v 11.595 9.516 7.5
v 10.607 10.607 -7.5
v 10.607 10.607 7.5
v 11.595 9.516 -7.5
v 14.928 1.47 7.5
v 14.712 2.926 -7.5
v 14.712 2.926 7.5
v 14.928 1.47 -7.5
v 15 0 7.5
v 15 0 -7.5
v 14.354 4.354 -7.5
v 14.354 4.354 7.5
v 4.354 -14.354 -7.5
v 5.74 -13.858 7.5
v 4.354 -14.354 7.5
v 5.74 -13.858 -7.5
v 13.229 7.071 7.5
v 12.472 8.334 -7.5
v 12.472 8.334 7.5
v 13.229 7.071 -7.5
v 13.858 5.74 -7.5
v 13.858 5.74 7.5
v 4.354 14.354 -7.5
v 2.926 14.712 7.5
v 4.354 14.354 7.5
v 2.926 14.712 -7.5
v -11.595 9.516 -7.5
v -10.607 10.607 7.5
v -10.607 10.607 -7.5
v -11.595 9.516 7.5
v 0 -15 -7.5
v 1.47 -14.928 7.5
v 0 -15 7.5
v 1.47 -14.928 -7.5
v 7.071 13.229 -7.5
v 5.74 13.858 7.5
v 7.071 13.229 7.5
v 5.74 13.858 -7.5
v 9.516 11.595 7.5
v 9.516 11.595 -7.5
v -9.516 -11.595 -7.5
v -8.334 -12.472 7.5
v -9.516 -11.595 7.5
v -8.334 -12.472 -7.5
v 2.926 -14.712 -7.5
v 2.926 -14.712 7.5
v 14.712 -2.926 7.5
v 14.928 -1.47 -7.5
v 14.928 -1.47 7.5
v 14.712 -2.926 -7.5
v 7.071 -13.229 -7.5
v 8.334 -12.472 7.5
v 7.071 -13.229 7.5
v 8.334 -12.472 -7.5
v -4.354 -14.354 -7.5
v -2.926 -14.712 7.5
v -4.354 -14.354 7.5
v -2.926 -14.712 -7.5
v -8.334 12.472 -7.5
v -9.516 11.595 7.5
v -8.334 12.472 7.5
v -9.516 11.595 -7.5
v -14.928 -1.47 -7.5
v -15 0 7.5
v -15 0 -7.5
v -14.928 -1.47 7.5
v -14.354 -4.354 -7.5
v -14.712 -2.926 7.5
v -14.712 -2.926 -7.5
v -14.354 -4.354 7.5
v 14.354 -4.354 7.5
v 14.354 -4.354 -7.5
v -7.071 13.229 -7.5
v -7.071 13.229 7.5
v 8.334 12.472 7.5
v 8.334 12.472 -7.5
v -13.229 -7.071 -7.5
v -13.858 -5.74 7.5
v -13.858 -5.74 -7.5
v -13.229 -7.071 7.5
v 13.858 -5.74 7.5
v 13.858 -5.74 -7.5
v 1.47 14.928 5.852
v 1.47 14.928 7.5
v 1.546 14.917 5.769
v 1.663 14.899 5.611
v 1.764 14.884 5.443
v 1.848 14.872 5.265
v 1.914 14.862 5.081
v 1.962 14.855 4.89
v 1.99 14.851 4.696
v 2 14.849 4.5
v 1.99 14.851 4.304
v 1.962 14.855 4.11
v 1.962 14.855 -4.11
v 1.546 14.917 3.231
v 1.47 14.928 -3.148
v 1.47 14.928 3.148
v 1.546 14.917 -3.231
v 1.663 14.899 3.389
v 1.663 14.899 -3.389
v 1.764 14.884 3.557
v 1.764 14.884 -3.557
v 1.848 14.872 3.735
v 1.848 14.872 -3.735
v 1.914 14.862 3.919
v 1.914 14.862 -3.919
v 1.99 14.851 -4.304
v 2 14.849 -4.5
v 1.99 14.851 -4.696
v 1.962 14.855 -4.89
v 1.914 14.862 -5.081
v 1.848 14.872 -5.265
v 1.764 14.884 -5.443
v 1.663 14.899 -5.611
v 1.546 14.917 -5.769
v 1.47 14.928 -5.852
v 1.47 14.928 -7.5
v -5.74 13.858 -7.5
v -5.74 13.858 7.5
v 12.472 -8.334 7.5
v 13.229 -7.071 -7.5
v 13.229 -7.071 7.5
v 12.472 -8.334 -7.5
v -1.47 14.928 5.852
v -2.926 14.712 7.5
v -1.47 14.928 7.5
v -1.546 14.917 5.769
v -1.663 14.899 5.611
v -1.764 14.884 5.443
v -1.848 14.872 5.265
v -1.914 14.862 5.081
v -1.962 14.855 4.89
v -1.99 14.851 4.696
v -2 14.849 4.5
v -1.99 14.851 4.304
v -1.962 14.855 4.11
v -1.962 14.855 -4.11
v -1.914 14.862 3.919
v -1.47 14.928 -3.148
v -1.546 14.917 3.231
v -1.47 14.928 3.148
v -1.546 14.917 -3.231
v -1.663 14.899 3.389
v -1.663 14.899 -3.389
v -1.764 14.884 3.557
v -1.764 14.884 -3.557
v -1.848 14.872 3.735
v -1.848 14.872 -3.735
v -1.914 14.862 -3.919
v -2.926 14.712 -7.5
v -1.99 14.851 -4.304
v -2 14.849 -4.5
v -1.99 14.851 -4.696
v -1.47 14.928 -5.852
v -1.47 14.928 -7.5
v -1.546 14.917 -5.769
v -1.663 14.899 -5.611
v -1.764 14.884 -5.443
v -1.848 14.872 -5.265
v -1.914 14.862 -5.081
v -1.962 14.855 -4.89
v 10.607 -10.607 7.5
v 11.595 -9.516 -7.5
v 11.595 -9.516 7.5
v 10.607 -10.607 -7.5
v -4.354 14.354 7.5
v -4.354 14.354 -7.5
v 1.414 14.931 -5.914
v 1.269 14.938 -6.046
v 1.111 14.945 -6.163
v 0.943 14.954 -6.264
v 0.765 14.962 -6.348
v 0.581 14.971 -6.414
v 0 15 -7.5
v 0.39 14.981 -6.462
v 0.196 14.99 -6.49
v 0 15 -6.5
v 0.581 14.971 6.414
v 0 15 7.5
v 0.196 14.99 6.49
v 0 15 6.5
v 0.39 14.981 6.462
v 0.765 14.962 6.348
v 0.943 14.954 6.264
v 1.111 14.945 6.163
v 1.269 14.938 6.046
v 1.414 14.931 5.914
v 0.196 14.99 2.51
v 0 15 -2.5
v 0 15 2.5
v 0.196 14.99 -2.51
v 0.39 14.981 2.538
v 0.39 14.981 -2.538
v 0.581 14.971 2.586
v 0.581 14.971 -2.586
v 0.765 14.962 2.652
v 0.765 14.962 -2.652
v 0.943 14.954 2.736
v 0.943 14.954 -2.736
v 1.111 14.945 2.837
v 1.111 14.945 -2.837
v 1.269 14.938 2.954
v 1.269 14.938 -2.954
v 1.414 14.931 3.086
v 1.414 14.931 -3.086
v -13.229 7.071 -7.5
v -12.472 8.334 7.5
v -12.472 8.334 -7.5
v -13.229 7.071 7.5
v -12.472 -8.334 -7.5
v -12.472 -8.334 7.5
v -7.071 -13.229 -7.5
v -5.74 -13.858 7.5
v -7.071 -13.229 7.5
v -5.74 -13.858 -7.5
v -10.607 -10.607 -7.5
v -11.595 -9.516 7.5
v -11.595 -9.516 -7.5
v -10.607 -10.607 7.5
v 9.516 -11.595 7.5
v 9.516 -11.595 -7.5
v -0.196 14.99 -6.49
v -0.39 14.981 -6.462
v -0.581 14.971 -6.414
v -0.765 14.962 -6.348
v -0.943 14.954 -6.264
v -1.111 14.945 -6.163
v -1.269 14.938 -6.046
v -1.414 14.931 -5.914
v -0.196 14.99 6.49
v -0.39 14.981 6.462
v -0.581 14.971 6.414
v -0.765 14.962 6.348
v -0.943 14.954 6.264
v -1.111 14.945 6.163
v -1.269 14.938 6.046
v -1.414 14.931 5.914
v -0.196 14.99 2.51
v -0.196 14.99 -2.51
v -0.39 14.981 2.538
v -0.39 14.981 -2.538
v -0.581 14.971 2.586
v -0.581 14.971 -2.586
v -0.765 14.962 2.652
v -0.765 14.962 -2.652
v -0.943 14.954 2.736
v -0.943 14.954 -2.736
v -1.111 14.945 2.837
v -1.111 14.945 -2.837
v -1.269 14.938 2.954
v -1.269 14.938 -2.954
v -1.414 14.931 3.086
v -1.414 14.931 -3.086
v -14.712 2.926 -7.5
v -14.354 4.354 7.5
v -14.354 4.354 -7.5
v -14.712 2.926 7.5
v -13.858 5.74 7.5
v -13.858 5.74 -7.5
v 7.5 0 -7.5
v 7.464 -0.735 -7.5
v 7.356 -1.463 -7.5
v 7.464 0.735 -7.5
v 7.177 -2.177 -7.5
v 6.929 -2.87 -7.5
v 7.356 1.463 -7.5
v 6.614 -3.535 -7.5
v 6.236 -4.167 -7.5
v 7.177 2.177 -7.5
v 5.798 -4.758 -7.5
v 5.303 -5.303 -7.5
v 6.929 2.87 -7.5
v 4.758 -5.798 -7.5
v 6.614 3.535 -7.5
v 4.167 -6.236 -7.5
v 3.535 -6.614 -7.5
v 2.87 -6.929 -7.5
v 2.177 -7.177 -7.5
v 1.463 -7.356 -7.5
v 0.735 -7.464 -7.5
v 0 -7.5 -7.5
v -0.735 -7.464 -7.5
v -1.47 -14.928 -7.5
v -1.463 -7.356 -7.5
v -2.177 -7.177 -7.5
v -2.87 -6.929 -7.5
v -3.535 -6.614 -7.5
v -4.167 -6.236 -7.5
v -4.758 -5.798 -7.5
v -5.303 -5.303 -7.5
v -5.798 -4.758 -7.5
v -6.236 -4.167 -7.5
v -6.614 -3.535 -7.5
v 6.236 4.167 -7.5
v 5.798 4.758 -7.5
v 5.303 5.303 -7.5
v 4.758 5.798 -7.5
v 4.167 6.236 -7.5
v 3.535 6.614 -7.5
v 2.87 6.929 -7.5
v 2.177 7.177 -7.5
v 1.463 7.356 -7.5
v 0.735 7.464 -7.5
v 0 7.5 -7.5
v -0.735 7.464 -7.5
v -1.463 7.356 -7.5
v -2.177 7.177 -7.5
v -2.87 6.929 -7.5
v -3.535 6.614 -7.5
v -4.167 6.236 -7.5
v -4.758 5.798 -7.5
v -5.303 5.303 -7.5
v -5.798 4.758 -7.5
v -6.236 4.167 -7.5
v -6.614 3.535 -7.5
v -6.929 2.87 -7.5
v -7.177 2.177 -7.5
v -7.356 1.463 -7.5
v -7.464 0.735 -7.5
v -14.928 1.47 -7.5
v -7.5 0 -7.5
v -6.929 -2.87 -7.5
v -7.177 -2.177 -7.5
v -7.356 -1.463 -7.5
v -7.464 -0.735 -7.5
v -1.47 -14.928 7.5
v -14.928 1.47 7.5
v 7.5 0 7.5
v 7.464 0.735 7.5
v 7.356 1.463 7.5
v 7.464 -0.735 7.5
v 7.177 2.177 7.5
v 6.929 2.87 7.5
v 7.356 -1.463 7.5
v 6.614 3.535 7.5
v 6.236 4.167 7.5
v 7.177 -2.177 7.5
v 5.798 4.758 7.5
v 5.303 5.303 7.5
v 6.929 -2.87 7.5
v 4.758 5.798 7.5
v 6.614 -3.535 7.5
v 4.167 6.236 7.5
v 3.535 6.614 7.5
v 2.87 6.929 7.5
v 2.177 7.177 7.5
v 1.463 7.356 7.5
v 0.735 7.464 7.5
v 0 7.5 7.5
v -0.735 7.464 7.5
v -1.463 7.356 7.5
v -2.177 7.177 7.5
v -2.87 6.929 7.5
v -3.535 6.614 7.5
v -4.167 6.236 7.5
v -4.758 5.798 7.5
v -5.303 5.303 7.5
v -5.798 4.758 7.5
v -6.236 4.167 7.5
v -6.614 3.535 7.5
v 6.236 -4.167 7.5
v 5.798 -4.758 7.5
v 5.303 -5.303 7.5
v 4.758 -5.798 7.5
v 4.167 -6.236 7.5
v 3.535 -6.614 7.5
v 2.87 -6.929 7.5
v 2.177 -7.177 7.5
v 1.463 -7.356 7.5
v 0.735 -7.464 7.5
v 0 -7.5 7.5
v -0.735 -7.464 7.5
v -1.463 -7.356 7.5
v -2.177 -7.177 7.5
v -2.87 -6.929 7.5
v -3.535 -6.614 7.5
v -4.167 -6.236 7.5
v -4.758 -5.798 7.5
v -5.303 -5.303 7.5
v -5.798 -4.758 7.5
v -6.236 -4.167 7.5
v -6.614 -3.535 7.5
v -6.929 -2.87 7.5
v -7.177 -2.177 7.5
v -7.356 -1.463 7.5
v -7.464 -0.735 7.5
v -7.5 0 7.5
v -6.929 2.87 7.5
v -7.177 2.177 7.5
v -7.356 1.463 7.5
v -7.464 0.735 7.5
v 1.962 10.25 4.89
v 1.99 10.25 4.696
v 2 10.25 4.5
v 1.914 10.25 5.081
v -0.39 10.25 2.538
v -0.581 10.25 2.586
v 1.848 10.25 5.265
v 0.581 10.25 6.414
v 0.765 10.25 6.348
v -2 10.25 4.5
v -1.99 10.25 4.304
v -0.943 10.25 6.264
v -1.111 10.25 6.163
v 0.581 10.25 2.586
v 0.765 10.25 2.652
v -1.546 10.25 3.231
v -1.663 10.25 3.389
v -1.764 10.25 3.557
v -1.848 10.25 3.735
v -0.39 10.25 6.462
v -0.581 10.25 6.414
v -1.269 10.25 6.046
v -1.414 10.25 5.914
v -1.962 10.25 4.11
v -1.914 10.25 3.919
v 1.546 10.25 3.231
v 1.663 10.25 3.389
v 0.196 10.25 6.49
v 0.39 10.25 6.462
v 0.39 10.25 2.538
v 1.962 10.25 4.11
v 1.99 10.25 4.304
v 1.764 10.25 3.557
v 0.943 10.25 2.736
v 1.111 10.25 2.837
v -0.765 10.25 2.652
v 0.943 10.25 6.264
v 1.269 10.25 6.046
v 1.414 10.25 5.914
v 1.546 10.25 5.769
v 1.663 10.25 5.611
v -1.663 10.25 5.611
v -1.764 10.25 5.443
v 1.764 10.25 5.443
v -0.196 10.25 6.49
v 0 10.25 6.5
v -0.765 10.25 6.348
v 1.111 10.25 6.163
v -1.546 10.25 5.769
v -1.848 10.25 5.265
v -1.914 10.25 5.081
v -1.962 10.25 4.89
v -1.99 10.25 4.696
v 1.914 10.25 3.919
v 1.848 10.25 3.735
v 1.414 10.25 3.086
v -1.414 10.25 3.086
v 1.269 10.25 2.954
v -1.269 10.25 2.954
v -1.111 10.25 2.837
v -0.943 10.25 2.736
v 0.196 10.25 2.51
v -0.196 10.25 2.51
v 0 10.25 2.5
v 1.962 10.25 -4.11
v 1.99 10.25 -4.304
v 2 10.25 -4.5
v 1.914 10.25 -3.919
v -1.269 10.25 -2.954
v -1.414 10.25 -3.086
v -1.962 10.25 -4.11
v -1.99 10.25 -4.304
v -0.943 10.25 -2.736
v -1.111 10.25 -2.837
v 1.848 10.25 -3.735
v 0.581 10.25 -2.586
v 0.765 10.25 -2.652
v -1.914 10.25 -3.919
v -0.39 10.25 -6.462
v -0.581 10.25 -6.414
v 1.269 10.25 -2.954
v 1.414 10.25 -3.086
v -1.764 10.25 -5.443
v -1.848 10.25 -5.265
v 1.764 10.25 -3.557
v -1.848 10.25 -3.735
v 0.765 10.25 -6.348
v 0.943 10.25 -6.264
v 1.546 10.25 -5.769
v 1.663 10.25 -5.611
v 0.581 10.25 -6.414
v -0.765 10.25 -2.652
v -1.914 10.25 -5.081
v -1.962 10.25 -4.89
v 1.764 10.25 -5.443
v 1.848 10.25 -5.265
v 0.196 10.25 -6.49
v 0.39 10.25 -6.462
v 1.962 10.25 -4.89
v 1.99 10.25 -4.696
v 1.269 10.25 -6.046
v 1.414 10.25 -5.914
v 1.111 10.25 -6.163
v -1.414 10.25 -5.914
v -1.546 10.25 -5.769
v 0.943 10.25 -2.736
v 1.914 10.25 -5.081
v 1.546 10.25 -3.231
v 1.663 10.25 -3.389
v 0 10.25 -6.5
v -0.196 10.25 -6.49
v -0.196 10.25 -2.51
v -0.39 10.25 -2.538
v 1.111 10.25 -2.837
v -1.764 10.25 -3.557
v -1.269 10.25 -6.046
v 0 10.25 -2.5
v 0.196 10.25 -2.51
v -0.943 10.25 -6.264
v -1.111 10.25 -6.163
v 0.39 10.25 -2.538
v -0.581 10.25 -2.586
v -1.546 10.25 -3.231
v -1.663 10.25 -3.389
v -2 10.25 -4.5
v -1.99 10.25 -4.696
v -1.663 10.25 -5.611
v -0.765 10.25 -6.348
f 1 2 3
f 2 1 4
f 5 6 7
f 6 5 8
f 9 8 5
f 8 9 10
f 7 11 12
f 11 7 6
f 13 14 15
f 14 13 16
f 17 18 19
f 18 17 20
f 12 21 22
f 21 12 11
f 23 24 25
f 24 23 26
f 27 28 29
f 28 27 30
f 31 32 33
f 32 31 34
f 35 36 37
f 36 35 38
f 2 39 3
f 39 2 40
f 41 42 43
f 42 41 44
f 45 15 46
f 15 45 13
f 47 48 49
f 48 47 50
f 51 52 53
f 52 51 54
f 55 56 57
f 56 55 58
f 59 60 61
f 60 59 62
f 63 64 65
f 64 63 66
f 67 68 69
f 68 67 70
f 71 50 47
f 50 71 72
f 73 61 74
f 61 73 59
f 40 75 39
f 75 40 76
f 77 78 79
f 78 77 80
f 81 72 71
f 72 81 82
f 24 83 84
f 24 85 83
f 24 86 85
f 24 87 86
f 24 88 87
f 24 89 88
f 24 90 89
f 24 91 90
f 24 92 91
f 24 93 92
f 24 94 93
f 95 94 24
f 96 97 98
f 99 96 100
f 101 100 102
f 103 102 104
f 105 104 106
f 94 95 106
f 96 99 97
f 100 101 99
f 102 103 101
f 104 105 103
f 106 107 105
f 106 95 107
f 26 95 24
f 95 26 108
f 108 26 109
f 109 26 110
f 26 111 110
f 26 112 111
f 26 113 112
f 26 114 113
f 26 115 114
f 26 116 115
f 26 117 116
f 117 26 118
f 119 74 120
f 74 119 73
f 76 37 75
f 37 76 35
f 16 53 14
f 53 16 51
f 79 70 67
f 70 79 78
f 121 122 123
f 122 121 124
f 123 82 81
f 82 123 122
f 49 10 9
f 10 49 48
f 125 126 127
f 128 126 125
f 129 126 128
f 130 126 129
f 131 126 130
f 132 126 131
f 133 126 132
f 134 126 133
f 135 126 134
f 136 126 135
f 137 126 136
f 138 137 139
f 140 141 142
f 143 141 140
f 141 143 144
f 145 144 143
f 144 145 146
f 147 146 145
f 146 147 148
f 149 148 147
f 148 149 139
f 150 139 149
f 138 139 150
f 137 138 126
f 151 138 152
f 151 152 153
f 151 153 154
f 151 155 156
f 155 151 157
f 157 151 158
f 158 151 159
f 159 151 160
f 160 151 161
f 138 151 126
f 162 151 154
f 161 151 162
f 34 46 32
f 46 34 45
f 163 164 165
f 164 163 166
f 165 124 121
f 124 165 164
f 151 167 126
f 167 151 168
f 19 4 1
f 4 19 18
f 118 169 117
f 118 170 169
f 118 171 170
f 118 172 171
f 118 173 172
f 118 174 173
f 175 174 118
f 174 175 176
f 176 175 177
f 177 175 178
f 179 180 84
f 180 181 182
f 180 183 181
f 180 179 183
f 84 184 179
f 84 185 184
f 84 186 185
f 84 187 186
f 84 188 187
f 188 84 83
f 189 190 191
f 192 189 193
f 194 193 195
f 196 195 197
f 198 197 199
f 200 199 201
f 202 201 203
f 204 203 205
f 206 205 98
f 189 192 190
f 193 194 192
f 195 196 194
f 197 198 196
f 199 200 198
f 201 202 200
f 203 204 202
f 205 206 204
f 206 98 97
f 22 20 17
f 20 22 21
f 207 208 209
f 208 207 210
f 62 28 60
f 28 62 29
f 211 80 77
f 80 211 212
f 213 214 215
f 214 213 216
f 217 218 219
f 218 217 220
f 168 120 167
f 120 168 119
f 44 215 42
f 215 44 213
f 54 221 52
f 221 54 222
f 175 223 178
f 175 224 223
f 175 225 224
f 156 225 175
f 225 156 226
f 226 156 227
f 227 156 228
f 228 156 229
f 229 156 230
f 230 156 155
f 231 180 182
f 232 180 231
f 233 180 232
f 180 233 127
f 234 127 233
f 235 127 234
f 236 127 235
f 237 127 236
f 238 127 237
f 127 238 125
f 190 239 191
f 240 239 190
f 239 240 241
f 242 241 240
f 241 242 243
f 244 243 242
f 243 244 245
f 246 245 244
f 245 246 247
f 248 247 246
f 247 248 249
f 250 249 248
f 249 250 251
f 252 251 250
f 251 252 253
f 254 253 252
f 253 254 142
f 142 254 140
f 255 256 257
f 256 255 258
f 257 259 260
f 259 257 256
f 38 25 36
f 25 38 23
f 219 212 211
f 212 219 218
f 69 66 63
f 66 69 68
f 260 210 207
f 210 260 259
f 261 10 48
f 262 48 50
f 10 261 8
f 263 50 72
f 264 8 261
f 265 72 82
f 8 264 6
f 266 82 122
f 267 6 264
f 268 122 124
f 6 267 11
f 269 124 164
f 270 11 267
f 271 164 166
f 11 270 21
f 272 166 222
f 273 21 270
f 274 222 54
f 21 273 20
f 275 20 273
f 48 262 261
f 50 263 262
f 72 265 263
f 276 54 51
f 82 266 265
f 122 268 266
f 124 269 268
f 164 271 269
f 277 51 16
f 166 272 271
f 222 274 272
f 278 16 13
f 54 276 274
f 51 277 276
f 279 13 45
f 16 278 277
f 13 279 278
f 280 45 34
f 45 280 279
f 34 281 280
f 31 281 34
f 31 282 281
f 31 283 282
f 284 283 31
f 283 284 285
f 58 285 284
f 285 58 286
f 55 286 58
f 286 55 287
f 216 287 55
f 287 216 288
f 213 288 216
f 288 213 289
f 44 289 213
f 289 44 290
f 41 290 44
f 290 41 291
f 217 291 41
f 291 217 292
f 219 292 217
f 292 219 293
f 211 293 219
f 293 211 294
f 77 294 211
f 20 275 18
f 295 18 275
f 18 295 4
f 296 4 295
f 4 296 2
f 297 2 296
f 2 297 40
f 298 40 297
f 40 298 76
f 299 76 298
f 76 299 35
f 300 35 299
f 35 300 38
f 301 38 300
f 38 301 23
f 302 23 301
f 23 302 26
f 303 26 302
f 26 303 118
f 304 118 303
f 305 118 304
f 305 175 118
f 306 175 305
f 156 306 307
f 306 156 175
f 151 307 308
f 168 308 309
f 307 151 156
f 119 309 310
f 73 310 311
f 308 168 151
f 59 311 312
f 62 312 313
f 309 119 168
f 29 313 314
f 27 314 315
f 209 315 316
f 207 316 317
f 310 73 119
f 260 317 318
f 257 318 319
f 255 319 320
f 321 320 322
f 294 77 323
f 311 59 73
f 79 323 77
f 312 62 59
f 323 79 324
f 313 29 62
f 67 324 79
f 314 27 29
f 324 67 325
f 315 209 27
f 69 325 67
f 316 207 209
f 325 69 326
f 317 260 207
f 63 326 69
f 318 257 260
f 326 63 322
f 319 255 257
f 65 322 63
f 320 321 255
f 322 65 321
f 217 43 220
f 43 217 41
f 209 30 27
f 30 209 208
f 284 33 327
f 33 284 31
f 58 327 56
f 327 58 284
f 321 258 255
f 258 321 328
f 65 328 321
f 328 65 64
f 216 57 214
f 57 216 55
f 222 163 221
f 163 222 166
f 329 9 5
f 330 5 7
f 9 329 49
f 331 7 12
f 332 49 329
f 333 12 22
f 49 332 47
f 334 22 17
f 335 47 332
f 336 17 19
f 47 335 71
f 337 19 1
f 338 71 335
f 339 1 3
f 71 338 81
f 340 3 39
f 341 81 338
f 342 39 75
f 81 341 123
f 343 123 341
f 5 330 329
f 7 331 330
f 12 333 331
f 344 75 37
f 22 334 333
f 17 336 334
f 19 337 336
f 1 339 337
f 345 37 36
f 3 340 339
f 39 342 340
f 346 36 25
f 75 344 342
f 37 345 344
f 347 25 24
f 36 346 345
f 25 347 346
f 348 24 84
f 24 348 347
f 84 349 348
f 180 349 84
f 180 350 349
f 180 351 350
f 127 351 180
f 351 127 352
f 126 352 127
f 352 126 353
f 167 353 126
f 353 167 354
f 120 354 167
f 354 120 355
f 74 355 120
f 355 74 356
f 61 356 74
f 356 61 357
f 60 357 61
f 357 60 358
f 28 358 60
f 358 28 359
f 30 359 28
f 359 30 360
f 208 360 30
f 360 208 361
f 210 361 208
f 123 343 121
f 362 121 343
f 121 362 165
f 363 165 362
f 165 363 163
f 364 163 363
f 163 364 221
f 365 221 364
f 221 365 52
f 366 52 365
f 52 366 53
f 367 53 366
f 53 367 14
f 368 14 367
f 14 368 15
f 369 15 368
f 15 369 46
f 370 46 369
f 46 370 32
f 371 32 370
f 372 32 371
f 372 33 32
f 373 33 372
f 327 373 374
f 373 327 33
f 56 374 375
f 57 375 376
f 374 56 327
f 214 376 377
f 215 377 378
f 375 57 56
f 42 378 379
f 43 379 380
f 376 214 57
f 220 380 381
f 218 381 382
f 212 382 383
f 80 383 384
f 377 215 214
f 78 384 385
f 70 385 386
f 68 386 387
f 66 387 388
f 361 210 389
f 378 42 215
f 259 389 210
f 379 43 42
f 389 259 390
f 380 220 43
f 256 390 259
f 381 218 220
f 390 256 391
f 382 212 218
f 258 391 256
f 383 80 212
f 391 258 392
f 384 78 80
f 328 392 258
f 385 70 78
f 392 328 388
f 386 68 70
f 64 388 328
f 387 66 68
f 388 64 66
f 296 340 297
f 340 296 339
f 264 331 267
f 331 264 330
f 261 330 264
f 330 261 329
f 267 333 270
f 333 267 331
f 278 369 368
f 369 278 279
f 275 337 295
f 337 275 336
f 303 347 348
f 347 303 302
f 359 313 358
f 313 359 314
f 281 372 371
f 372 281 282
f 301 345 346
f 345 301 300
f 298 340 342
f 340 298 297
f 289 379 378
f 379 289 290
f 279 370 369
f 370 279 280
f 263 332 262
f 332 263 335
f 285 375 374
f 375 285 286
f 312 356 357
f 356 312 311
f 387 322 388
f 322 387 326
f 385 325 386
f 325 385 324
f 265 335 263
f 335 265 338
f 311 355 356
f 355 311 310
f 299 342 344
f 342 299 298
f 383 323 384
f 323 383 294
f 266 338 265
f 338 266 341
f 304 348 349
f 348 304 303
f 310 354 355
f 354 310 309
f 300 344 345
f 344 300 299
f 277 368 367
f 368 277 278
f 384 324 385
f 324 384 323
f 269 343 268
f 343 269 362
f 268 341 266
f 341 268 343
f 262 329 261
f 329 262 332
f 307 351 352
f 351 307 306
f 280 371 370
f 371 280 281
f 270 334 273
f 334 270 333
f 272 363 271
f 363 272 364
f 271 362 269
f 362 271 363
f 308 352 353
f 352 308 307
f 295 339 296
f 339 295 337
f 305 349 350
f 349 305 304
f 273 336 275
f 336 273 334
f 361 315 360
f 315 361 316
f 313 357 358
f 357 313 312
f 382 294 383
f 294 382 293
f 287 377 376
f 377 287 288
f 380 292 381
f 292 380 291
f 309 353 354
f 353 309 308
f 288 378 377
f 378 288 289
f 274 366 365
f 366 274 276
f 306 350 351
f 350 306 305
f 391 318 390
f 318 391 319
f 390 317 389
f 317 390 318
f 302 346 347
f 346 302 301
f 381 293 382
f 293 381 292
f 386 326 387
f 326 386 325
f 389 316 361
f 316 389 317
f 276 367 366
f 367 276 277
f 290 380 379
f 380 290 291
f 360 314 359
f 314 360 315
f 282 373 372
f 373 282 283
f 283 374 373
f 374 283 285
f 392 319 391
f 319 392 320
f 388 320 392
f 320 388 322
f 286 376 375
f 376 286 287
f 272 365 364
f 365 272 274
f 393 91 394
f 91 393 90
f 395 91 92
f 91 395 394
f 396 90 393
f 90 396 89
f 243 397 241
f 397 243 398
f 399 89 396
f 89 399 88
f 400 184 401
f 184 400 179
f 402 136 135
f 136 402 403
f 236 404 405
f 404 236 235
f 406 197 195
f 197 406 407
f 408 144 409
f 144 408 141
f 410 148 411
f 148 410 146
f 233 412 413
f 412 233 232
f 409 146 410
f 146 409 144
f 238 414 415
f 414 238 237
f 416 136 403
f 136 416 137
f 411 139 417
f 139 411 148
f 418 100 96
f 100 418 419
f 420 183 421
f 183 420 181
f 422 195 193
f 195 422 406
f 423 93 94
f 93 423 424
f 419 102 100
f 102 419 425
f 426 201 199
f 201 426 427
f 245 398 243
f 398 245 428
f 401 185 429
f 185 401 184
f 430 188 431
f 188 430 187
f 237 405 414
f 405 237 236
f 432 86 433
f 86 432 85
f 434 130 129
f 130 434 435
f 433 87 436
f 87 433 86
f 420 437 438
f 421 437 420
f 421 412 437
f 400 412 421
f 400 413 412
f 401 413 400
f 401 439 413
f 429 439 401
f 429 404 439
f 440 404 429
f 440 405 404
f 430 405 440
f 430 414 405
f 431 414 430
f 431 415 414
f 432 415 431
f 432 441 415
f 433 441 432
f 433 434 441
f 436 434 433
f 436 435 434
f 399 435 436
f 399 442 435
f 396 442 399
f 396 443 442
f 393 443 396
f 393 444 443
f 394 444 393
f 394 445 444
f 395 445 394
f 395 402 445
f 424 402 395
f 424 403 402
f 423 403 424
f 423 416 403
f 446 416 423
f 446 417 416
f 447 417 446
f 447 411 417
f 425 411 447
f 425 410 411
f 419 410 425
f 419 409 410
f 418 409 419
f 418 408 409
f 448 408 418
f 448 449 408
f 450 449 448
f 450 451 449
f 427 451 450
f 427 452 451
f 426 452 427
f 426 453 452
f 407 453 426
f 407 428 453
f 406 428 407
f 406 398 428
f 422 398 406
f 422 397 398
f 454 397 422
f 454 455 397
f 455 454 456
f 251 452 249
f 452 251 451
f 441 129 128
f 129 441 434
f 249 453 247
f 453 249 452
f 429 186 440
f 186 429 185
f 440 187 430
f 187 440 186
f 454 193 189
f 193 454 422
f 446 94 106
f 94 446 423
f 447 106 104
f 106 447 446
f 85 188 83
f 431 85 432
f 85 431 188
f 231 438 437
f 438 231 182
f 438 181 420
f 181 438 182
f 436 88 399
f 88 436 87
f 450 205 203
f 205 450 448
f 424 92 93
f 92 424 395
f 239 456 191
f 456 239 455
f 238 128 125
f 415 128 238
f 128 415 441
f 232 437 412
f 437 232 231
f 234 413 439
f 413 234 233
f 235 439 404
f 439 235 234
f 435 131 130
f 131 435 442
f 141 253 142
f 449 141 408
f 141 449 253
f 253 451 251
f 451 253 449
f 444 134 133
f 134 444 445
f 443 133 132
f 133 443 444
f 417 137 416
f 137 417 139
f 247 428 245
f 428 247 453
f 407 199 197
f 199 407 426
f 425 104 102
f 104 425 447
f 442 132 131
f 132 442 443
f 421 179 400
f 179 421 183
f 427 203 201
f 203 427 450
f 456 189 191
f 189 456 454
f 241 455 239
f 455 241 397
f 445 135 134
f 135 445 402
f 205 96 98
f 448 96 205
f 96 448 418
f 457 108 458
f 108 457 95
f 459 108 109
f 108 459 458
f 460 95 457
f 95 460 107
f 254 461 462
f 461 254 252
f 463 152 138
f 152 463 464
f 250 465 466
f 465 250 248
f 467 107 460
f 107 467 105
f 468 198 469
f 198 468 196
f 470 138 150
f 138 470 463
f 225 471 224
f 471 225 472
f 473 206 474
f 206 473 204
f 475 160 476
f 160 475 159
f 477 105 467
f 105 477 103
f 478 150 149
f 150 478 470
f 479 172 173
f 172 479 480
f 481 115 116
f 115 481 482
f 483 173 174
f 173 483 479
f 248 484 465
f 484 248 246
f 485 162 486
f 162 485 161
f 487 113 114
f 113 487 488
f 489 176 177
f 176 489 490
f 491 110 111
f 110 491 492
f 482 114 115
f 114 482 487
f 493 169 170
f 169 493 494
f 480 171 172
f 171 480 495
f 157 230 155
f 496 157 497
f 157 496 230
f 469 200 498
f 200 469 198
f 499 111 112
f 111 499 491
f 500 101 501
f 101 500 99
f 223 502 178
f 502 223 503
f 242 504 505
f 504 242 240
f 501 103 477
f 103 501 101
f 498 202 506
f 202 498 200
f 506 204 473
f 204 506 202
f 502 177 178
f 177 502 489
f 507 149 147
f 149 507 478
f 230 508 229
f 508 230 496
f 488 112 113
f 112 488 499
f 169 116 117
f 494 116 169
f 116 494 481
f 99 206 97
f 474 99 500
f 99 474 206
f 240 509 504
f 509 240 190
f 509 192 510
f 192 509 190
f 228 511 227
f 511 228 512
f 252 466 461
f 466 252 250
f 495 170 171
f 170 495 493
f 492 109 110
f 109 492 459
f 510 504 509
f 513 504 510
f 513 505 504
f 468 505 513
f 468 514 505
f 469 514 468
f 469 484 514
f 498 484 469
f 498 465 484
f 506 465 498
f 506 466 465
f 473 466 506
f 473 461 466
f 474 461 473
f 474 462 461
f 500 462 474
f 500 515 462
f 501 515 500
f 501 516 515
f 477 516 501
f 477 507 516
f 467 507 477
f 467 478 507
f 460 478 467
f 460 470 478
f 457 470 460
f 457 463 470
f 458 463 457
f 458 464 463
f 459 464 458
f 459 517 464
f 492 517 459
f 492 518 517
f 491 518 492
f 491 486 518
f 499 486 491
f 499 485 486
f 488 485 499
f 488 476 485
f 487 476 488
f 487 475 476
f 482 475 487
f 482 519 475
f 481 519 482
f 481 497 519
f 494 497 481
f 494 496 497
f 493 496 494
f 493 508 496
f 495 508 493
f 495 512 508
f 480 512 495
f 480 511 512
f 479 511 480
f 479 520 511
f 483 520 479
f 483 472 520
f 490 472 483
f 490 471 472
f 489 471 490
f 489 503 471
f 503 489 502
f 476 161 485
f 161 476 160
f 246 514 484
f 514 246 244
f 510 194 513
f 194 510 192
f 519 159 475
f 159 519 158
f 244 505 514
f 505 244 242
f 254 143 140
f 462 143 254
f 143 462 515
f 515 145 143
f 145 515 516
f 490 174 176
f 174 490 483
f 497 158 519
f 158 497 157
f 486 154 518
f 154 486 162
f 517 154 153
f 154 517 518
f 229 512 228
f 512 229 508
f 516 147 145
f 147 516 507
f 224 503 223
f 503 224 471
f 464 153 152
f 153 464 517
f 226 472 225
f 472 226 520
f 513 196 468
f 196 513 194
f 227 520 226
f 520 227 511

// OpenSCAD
// COBRA Vertebra - C3 V2
// Height: 15.0mm, OD: 30.0mm

$fn = 64;

difference() {
    // Outer cylinder
    cylinder(h=15.0, d=30.0, center=true);
    
    // Inner channel
    cylinder(h=17.0, d=15.0, center=true);

    // Pivot holes
    translate([0, 15.0, 4.5])
    rotate([90, 0, 0])
    cylinder(h=9.5, d=4, center=true);
    
    translate([0, 15.0, -4.5])
    rotate([90, 0, 0])
    cylinder(h=9.5, d=4, center=true);
}
